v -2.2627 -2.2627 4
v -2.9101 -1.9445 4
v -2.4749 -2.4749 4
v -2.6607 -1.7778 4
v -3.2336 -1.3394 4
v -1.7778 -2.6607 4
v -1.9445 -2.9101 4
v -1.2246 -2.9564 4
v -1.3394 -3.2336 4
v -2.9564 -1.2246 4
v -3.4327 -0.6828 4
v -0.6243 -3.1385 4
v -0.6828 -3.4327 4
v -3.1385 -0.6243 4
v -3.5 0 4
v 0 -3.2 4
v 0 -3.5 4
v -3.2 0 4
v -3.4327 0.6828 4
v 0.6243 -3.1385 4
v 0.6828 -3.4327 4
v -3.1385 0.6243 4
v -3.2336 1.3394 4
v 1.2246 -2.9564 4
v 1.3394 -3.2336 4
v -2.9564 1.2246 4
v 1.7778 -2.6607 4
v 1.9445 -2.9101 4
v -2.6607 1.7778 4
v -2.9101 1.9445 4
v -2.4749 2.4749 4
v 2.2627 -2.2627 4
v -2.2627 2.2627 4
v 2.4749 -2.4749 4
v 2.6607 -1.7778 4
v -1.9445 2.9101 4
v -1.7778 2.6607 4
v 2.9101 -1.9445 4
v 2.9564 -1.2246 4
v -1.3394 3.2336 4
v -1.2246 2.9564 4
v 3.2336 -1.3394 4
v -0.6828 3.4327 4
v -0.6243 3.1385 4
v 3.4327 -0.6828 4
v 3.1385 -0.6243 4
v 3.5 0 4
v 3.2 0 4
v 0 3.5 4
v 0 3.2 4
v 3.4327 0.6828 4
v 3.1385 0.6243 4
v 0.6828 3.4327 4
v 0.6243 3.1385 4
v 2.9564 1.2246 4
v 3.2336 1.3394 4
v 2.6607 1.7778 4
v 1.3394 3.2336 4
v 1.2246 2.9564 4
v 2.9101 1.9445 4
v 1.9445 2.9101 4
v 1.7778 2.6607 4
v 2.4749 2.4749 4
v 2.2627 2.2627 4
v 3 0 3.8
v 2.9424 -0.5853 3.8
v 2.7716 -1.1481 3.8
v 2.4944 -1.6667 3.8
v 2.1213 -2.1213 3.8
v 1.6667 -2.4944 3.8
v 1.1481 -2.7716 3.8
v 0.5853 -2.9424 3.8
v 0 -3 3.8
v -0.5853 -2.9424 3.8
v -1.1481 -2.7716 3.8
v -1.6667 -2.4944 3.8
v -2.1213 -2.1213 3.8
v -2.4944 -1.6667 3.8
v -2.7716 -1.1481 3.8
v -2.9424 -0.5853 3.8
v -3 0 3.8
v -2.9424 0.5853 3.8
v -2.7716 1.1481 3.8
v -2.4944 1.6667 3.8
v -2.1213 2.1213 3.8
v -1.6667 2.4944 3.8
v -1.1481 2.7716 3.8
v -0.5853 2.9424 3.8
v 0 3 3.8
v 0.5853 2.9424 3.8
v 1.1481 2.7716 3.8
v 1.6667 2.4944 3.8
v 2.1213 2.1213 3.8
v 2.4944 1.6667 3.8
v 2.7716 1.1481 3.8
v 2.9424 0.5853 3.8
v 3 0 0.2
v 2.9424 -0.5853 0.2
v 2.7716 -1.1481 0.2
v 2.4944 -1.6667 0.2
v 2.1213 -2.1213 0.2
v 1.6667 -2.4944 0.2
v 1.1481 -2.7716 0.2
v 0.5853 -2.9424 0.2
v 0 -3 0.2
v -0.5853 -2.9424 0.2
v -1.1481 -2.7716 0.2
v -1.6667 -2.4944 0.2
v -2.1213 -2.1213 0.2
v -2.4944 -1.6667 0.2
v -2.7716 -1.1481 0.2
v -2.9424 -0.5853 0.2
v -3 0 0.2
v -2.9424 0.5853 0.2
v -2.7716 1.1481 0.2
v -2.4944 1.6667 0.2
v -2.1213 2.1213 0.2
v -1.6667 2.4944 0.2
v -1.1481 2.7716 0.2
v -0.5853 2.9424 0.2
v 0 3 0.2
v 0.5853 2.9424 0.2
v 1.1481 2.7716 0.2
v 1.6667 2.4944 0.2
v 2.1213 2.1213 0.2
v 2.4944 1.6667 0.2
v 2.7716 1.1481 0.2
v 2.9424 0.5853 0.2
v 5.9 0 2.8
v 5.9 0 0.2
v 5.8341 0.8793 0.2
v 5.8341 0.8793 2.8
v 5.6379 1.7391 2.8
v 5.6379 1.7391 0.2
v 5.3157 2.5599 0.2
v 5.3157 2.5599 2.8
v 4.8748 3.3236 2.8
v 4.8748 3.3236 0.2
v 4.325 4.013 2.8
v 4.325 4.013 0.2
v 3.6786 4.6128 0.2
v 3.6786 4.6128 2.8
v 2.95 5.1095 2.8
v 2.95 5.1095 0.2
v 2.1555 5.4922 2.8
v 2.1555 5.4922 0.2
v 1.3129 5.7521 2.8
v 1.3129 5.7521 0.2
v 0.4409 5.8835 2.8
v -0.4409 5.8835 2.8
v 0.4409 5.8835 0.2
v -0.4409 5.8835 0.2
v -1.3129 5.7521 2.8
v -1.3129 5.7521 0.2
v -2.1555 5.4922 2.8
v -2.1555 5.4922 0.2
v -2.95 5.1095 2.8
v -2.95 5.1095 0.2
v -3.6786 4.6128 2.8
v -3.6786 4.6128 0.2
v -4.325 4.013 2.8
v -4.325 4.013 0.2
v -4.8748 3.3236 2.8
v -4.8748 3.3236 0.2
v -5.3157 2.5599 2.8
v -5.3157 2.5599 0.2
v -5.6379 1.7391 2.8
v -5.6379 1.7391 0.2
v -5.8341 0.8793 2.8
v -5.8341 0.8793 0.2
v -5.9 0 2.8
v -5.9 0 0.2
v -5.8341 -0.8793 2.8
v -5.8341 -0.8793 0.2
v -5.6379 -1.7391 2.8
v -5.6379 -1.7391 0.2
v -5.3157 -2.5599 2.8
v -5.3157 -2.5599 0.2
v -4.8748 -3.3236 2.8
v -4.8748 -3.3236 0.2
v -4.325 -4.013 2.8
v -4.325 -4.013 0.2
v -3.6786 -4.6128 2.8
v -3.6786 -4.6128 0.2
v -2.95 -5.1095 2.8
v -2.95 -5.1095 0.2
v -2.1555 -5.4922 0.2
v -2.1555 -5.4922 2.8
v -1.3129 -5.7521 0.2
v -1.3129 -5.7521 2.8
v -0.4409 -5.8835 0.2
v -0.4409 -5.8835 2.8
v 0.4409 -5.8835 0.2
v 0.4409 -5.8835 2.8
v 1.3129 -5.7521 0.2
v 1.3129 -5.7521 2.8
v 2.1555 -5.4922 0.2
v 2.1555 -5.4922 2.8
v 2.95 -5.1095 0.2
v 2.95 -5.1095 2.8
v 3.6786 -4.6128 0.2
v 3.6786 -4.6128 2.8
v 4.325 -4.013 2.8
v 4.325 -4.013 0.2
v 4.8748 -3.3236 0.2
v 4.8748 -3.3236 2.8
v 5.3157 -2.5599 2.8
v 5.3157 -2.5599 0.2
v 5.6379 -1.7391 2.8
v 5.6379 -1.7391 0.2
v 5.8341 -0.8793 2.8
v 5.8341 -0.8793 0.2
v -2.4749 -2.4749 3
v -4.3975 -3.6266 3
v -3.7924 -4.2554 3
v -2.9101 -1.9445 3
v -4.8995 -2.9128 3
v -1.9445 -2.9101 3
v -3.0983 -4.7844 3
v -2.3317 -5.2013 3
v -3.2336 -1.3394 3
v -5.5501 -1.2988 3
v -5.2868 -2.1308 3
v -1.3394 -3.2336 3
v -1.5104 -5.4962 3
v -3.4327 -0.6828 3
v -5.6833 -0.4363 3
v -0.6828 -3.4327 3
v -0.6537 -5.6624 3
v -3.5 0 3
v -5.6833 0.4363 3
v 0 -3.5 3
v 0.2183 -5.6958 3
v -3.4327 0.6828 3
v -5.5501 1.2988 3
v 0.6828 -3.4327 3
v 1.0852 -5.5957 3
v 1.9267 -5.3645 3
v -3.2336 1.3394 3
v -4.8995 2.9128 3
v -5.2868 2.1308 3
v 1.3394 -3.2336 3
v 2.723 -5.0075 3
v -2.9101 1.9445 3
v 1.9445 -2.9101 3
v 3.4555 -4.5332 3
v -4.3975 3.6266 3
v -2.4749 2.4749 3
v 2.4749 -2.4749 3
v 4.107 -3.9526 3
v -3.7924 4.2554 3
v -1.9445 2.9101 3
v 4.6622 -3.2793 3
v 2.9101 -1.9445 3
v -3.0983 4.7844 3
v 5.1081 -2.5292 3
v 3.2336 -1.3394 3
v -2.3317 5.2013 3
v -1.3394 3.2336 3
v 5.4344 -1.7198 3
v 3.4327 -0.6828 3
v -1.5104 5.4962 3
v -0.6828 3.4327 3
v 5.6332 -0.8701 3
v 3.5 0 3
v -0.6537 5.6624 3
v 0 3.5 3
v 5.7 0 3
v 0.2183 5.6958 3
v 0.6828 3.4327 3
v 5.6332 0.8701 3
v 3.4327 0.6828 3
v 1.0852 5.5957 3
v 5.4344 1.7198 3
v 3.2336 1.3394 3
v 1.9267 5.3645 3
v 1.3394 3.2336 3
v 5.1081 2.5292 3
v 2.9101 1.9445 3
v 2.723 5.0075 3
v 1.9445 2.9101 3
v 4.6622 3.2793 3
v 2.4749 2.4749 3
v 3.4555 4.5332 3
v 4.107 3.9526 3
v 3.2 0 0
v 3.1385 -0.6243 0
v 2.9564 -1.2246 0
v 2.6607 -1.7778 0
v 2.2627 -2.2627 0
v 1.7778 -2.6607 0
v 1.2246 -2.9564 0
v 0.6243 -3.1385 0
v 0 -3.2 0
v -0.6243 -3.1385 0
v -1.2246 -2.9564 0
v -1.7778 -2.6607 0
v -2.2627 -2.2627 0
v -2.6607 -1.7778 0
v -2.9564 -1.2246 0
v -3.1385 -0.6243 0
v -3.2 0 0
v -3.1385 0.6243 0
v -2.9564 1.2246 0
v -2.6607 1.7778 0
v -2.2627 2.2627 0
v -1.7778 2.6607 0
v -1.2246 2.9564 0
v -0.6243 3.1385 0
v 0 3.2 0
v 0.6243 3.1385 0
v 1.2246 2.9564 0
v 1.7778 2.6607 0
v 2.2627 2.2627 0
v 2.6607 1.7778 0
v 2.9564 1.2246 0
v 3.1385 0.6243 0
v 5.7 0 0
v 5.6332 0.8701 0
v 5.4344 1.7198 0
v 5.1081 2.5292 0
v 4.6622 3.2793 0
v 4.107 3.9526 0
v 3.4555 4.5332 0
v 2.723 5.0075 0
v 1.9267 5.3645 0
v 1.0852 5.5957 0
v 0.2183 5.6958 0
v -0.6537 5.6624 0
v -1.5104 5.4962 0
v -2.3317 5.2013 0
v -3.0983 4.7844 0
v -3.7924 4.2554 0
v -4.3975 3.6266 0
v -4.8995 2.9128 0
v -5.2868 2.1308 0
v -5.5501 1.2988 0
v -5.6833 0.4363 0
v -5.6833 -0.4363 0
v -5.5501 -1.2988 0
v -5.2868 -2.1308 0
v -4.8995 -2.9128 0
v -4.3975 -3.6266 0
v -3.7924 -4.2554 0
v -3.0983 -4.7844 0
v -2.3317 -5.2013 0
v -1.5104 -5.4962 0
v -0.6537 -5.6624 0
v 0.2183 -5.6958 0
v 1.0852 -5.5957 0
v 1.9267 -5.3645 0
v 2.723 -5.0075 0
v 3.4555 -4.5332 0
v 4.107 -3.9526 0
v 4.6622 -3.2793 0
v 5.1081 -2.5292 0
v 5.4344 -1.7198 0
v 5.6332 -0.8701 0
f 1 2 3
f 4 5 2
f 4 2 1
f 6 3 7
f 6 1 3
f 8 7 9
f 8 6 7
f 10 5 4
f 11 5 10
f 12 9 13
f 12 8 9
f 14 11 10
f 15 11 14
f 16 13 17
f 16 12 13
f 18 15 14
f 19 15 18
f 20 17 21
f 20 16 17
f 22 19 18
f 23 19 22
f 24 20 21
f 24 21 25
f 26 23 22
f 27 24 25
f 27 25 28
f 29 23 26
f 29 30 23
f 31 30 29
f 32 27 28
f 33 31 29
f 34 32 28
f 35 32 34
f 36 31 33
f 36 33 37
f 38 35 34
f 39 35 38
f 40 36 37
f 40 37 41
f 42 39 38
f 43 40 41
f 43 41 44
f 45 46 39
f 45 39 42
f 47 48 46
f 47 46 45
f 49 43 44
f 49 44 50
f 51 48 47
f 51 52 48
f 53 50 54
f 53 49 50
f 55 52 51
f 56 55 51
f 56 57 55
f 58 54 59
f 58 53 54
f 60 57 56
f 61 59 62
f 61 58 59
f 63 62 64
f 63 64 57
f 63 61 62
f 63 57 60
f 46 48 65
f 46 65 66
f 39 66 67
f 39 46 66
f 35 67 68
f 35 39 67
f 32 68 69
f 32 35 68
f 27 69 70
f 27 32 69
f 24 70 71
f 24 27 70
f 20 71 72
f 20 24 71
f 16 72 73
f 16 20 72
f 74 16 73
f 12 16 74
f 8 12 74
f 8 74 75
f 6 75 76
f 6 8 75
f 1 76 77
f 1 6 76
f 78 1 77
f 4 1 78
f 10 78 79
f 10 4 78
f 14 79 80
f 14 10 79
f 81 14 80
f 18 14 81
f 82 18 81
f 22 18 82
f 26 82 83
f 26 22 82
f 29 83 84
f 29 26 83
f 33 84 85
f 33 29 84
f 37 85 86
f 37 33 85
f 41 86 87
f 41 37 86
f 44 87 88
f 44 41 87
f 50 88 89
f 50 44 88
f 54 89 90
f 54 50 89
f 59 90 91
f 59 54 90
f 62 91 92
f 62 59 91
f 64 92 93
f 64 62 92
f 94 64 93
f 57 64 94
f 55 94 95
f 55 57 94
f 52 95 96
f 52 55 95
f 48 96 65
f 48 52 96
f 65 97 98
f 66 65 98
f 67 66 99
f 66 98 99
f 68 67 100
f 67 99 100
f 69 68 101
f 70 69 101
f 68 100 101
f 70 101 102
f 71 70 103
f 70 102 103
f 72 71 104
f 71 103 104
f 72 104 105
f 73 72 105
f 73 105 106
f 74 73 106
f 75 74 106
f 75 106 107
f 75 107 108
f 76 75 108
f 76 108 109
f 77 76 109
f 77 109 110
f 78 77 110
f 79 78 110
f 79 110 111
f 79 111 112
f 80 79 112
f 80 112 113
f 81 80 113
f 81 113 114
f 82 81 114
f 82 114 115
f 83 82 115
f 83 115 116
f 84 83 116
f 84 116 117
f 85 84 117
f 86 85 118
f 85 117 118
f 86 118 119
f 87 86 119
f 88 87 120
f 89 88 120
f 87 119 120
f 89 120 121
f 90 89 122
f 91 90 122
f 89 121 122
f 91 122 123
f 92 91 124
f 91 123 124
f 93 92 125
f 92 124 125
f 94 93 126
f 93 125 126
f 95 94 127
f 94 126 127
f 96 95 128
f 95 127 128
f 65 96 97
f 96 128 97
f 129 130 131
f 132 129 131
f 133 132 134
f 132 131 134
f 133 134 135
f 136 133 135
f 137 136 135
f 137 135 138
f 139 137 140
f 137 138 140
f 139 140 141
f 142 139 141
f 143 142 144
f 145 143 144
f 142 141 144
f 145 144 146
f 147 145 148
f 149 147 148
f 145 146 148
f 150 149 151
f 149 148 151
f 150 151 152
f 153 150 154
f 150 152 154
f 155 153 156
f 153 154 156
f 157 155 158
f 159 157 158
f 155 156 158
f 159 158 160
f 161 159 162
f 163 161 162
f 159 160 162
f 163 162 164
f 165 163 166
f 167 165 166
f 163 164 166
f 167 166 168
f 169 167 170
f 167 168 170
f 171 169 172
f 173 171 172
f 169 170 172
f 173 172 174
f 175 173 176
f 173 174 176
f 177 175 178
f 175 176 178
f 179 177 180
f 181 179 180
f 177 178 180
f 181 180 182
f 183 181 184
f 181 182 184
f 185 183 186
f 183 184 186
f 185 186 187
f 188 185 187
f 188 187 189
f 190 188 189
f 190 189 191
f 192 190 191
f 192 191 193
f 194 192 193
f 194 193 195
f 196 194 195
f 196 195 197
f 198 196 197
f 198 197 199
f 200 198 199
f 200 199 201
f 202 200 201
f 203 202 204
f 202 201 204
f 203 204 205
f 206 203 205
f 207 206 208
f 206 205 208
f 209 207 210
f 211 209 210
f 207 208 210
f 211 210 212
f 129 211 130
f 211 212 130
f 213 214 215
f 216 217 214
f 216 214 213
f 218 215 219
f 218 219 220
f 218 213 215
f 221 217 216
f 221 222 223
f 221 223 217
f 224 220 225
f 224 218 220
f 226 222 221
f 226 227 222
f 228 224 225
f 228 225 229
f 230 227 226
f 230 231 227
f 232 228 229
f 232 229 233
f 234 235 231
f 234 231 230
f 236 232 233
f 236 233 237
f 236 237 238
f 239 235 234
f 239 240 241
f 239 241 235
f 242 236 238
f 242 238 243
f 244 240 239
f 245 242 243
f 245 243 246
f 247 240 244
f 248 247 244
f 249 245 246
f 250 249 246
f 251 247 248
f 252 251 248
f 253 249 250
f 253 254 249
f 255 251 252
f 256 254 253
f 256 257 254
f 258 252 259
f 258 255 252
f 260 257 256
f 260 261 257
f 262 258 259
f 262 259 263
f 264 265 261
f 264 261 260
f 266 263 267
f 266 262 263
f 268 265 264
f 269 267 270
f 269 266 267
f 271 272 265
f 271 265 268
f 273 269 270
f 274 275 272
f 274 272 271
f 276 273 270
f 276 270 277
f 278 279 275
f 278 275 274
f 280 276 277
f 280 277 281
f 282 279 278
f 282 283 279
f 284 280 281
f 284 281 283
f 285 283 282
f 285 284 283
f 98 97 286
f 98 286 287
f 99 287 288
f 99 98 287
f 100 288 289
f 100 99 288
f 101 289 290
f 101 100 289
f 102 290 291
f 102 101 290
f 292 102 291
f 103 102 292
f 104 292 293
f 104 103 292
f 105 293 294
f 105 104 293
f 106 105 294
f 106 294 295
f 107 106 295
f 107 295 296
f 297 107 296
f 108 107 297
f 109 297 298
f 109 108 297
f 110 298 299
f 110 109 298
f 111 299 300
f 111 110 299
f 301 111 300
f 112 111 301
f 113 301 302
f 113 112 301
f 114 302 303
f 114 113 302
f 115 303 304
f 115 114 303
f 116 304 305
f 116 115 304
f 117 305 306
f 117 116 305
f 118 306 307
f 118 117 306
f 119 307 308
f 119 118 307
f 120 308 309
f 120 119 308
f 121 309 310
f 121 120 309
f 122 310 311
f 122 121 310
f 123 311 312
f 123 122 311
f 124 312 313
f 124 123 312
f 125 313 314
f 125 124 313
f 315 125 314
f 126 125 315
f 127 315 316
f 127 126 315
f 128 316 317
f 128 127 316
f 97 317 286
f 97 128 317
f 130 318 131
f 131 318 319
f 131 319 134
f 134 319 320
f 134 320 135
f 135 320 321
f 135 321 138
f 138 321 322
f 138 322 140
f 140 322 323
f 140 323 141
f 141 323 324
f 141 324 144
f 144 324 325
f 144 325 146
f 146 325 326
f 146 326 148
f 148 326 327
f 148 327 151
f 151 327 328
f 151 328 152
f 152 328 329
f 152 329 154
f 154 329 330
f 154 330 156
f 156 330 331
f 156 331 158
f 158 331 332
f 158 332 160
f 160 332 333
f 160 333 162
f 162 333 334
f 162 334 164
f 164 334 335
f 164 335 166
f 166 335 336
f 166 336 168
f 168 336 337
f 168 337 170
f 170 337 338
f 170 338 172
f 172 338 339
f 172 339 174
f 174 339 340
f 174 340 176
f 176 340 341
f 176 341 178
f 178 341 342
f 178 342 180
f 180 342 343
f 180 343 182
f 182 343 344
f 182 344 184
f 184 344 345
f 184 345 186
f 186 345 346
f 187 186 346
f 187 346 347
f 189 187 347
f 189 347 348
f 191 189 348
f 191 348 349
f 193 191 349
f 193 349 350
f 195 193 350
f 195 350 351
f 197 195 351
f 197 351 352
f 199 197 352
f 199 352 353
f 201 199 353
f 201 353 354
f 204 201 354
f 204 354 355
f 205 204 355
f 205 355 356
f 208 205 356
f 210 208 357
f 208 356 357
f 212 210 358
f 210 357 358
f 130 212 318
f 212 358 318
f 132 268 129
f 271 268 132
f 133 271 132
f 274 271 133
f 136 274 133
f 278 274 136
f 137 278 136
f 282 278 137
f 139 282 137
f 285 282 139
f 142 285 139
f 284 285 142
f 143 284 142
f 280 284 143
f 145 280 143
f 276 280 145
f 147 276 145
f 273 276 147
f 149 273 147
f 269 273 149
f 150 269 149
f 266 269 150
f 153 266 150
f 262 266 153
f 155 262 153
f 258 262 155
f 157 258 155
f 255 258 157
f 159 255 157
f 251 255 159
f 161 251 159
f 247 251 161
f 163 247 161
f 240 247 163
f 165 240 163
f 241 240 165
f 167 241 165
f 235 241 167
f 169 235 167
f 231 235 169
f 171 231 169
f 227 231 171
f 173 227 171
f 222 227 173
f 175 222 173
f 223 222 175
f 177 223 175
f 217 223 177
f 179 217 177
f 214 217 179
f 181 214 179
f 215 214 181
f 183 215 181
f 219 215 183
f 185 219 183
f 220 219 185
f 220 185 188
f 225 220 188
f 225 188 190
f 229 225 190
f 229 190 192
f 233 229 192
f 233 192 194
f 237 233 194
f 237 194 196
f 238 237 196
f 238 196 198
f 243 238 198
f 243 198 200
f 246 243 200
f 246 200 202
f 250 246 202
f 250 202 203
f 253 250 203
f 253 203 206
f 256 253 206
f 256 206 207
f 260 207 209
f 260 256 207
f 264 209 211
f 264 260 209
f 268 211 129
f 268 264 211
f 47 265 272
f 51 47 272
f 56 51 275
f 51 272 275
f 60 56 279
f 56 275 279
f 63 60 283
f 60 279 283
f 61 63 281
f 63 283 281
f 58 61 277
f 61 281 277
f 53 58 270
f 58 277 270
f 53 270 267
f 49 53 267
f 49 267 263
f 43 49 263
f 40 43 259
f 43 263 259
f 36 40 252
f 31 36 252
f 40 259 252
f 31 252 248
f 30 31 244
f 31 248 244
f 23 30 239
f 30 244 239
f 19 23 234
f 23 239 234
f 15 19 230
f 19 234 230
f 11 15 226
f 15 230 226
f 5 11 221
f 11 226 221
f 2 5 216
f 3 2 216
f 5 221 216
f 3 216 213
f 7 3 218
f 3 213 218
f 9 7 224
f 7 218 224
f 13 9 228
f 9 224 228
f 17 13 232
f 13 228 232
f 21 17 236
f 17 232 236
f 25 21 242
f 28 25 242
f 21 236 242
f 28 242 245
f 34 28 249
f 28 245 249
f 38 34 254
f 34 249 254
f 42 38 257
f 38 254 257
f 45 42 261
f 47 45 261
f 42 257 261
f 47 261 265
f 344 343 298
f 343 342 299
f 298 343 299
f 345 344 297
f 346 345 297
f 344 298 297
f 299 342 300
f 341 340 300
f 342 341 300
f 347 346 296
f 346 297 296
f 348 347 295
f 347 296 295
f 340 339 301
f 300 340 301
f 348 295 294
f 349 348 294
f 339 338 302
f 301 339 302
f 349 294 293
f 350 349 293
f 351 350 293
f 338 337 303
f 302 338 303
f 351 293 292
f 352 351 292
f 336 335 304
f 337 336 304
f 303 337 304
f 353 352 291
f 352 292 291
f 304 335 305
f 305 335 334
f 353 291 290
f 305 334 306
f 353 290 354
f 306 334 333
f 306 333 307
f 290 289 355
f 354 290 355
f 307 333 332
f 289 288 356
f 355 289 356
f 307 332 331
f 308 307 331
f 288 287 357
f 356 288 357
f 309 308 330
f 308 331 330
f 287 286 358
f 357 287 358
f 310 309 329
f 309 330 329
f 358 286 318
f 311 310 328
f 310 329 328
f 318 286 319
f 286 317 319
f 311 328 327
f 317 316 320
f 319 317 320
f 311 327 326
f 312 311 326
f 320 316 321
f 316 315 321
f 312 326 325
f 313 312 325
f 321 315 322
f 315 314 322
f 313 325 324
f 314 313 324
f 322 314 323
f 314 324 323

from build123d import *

# Parameters (mm, degrees)
F0_R     = 5.9
F1_DEPTH = 3
F2_R     = 3.5
F3_DEPTH = 1
F4_R     = 3
F5_DEPTH = 4.001
F6_SIZE  = 0.2


with BuildPart() as f1:
    # F0 (on Top) → F1 (new body)
    with BuildSketch(Plane.XY):
        Circle(F0_R)
    extrude(amount=F1_DEPTH)

    # F2 (on face) → F3 (join)
    with BuildSketch(Plane.XY.offset(3)):
        Circle(F2_R)
    extrude(amount=F3_DEPTH)

    # F4 (on face) → F5 (cut, through all)
    with BuildSketch(Plane(origin=(0, 0, 0), x_dir=(1, 0, 0), z_dir=(0, 0, -1))):
        Circle(F4_R)
    extrude(amount=-F5_DEPTH, mode=Mode.SUBTRACT)

    # F6
    f6_edges = [f1.edges().sort_by_distance(p)[0] for p in [
        (-5.9, 0, 3),
        (-5.9, 0, 0),
        (-3, 0, 0),
        (-3, 0, 4),
    ]]
    chamfer(f6_edges, length=F6_SIZE)


solid = f1.part
